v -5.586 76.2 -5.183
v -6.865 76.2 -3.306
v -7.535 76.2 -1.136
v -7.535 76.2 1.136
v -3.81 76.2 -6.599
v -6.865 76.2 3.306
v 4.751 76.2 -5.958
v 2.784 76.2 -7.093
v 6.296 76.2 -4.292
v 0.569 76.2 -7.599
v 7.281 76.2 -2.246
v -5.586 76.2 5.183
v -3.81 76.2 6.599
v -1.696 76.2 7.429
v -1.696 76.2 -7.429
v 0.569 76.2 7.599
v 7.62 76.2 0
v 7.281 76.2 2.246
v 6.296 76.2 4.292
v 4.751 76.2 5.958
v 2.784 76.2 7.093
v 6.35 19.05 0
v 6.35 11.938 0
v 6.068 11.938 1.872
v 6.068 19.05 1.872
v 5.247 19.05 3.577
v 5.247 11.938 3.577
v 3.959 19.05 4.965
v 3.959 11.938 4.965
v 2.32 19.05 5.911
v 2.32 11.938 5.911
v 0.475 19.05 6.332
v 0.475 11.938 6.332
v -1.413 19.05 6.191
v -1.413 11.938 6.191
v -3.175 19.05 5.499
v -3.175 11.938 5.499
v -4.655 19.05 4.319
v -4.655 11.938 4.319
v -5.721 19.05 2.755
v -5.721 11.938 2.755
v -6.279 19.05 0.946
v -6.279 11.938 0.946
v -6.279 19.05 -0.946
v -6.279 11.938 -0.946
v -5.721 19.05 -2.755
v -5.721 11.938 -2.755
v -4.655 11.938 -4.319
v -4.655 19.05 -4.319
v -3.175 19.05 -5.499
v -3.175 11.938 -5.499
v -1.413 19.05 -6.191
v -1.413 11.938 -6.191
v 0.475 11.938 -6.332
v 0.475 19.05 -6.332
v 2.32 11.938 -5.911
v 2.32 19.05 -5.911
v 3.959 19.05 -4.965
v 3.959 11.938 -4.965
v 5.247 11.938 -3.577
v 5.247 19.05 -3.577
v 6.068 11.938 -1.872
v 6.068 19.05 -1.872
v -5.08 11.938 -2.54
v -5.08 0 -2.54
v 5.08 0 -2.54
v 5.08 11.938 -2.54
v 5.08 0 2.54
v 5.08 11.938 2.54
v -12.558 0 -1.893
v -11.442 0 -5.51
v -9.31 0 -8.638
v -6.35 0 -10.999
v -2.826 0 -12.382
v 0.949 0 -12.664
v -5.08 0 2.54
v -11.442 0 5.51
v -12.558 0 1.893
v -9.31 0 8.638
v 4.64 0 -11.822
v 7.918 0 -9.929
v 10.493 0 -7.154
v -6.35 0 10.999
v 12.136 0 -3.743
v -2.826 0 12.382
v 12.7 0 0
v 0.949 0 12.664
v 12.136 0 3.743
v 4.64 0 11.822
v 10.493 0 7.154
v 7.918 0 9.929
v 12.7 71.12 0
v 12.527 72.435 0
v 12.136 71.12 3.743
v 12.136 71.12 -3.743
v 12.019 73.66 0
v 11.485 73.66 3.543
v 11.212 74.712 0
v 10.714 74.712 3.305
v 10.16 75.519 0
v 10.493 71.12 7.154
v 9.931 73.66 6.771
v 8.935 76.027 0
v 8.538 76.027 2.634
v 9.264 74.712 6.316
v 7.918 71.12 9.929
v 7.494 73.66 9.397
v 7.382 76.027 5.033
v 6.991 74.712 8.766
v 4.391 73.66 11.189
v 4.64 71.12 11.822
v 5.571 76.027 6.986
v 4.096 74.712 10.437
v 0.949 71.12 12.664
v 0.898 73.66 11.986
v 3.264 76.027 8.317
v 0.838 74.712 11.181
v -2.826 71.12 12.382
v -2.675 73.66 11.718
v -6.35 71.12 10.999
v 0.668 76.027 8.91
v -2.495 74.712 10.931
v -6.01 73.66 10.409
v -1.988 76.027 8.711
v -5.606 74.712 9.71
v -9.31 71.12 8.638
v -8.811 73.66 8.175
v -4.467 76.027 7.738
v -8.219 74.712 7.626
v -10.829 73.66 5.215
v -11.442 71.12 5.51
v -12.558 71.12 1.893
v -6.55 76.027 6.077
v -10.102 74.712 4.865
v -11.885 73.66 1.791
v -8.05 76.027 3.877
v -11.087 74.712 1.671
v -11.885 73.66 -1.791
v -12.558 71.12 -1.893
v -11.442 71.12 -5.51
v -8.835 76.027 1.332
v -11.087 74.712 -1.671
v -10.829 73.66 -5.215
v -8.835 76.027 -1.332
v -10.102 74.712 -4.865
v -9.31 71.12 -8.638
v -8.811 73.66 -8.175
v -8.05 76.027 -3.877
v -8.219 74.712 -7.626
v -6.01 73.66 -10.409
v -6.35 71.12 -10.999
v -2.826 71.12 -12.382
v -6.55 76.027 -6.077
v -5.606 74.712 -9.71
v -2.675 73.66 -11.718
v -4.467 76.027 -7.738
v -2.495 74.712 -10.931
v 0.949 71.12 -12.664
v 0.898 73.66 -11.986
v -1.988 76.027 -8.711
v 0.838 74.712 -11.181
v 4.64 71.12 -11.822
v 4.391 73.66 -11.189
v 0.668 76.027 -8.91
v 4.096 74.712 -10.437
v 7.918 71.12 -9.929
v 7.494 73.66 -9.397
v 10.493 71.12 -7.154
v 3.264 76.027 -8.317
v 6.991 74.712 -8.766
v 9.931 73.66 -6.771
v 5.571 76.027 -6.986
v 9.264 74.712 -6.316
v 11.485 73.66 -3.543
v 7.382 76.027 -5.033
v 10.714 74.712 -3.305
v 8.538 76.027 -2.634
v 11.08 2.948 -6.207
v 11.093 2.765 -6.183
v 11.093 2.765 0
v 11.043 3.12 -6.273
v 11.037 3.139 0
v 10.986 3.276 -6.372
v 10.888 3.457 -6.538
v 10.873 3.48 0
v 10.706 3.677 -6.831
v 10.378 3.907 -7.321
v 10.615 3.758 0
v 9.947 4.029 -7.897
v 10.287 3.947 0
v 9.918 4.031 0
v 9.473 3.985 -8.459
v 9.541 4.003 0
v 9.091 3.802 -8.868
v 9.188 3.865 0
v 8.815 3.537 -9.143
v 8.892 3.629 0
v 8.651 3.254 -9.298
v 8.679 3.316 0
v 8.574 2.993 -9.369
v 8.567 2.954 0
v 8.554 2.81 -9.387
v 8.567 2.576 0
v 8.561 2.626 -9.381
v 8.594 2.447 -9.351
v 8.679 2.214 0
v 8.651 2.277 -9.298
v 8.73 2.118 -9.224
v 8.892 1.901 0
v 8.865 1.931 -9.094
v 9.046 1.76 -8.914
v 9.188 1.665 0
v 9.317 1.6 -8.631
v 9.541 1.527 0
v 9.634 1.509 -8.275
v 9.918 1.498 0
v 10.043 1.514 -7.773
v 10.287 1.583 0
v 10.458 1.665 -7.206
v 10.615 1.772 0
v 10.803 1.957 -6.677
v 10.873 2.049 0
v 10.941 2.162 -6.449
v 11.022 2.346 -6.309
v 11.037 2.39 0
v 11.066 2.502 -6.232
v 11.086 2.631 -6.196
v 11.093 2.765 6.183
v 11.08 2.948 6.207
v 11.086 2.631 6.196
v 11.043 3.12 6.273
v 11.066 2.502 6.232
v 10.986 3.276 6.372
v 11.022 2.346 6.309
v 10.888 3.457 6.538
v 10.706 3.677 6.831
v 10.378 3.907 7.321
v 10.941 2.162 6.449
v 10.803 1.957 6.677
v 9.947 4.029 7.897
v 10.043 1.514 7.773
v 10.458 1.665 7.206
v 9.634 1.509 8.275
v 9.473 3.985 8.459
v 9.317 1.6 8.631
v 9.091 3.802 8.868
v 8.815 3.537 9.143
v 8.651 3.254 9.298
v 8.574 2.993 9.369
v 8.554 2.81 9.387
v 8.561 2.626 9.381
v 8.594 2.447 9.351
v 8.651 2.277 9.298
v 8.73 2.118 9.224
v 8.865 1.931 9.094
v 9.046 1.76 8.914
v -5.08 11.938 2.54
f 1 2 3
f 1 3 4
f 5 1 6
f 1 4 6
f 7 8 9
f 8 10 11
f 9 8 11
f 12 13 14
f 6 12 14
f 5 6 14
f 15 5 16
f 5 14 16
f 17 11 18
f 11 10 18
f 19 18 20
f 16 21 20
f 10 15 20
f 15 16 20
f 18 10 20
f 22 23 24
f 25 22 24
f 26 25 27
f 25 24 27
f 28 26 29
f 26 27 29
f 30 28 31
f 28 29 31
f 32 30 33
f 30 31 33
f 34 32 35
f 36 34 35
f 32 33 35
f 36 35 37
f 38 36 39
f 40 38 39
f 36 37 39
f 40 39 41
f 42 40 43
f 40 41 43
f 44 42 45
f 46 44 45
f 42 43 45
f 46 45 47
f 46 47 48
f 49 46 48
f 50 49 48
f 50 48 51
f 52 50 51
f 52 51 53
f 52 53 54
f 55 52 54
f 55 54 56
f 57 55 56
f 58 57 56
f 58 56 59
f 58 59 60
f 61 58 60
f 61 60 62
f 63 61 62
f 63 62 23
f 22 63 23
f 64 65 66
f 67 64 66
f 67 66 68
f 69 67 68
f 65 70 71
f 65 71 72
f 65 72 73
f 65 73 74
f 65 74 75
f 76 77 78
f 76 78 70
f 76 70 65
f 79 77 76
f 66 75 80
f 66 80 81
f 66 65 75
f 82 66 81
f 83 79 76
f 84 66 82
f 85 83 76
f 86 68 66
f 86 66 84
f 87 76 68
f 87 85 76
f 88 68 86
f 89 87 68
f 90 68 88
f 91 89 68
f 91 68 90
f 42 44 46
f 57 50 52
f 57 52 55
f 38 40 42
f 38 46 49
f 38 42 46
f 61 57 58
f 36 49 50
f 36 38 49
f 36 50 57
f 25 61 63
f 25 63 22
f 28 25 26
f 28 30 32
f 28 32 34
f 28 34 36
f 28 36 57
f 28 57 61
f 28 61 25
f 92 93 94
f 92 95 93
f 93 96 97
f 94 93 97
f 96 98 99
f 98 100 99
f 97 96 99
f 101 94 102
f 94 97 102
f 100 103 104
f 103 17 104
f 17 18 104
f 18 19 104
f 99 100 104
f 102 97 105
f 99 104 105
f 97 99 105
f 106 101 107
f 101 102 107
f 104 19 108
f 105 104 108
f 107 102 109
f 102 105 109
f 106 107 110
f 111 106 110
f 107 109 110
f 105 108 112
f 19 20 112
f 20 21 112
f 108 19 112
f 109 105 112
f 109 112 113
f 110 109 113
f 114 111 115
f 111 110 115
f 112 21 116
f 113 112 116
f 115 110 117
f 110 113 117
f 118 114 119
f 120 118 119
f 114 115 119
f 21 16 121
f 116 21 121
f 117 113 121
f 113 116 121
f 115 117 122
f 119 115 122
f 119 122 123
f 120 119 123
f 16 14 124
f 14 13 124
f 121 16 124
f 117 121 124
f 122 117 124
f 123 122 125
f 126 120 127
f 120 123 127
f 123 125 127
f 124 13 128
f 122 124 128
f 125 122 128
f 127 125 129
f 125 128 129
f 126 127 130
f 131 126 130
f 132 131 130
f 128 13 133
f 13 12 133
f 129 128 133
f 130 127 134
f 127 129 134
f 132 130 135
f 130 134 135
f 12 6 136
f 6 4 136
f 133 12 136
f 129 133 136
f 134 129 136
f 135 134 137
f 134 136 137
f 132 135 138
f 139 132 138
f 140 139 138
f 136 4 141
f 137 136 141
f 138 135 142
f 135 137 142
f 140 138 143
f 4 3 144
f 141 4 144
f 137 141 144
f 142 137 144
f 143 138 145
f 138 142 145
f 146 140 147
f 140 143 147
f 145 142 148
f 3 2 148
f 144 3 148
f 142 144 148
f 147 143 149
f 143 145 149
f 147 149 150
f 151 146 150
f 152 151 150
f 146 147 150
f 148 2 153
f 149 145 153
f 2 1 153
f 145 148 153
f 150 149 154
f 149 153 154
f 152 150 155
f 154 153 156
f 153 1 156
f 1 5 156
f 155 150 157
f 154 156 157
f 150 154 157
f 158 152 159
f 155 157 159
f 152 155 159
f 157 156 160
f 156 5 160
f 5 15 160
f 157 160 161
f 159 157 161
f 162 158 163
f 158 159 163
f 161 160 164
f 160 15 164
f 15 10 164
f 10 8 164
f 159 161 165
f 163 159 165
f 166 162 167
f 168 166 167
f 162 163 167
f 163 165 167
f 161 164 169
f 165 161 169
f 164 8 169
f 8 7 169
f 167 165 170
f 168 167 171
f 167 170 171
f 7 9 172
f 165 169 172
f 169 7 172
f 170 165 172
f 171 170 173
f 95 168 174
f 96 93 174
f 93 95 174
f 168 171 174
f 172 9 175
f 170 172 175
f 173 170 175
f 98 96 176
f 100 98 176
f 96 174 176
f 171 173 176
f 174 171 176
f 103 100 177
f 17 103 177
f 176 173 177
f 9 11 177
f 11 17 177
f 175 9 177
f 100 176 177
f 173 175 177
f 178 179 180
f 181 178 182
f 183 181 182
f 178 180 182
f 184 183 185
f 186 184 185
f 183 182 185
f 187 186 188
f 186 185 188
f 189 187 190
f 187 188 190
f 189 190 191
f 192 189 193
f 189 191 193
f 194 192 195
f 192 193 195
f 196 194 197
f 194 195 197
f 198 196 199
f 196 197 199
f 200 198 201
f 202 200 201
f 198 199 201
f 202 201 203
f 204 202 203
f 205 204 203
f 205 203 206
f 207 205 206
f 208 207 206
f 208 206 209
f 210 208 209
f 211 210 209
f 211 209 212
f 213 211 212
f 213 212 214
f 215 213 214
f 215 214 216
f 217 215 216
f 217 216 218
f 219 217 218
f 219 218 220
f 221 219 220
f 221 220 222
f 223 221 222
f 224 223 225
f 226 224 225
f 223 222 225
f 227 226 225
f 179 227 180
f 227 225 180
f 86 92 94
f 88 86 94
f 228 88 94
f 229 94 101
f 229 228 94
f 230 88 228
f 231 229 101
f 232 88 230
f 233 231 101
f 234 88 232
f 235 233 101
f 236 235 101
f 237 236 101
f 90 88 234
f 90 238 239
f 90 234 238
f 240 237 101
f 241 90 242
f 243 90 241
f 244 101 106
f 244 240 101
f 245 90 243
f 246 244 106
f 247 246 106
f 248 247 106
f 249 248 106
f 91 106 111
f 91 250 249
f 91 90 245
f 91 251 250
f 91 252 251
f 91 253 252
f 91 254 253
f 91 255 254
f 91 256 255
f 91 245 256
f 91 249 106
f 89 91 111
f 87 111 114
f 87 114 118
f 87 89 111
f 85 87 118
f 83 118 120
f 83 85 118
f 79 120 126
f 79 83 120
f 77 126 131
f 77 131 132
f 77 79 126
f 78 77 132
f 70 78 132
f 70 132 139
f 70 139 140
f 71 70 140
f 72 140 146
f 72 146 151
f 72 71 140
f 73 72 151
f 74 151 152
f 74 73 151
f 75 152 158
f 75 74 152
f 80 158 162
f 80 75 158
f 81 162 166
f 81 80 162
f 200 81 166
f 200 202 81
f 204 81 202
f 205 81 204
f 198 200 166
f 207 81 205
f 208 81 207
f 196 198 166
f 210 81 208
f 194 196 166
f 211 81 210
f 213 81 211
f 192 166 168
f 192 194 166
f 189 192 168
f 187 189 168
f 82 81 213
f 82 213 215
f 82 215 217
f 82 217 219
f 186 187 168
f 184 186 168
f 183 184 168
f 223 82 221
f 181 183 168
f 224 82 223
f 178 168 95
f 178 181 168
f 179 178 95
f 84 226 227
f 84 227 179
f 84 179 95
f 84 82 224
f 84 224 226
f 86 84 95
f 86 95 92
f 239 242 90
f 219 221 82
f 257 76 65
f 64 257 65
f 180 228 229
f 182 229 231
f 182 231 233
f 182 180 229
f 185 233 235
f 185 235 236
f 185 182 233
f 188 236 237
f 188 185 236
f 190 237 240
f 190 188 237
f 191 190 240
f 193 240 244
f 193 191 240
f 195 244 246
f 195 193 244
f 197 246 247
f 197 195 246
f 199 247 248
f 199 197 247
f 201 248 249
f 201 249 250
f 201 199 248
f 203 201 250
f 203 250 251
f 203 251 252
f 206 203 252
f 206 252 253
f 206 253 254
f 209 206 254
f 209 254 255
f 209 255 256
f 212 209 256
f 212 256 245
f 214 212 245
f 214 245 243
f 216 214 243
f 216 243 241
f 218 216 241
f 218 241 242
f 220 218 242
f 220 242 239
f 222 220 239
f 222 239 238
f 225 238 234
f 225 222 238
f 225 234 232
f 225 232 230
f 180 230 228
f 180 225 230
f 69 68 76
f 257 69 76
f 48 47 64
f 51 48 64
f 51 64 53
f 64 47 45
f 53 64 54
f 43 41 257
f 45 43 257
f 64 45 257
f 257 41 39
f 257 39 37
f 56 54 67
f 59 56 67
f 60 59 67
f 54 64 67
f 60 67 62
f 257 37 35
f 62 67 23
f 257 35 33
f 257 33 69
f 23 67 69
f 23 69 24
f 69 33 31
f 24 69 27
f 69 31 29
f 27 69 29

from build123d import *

# Parameters (mm, degrees)
F0_R           = 12.7
F1_DEPTH       = 76.2
F3_R           = 6.35
F4_DEPTH       = 19.05
F5_R           = 6.35
F6_DEPTH       = 11.938
F7_DEPTH       = 19.05
F8_R           = 5.08
F9_R           = 1.27
F10_DEPTH      = 25.4
F10_DEPTH_BACK = 25.4


with BuildPart() as f1:
    # F0 (on Front) → F1 (new body)
    with BuildSketch(Plane.XZ):
        Circle(F0_R)
    extrude(amount=-F1_DEPTH)

    # F3 (on face) → F4 (cut)
    with BuildSketch(Plane.XZ):
        Circle(F3_R)
    extrude(amount=-F4_DEPTH, mode=Mode.SUBTRACT)

    # F5 (on face) → F6 (join)
    with BuildSketch(Plane.XZ):
        Circle(F5_R)
    extrude(amount=-F6_DEPTH)

    # F2 (on face) → F7 (cut)
    with BuildSketch(Plane.XZ):
        Polygon((5.08, -2.54), (5.08, 0), (5.08, 2.54), (-5.08, 2.54), (-5.08, -2.54), align=None)
    extrude(amount=-F7_DEPTH, mode=Mode.SUBTRACT)

    # F8
    f8_edges = [f1.edges().sort_by_distance(p)[0] for p in [
        (-12.7, 76.2, 0),
    ]]
    fillet(f8_edges, radius=F8_R)

    # F9 (on Top) → F10 (cut, two sides)
    with BuildSketch(Plane.XY) as f10_sk:
        with Locations((9.823189, 2.76481)):
            Circle(F9_R)
    extrude(amount=F10_DEPTH, mode=Mode.SUBTRACT)
    extrude(f10_sk.sketch, amount=-F10_DEPTH_BACK, mode=Mode.SUBTRACT)


solid = f1.part
